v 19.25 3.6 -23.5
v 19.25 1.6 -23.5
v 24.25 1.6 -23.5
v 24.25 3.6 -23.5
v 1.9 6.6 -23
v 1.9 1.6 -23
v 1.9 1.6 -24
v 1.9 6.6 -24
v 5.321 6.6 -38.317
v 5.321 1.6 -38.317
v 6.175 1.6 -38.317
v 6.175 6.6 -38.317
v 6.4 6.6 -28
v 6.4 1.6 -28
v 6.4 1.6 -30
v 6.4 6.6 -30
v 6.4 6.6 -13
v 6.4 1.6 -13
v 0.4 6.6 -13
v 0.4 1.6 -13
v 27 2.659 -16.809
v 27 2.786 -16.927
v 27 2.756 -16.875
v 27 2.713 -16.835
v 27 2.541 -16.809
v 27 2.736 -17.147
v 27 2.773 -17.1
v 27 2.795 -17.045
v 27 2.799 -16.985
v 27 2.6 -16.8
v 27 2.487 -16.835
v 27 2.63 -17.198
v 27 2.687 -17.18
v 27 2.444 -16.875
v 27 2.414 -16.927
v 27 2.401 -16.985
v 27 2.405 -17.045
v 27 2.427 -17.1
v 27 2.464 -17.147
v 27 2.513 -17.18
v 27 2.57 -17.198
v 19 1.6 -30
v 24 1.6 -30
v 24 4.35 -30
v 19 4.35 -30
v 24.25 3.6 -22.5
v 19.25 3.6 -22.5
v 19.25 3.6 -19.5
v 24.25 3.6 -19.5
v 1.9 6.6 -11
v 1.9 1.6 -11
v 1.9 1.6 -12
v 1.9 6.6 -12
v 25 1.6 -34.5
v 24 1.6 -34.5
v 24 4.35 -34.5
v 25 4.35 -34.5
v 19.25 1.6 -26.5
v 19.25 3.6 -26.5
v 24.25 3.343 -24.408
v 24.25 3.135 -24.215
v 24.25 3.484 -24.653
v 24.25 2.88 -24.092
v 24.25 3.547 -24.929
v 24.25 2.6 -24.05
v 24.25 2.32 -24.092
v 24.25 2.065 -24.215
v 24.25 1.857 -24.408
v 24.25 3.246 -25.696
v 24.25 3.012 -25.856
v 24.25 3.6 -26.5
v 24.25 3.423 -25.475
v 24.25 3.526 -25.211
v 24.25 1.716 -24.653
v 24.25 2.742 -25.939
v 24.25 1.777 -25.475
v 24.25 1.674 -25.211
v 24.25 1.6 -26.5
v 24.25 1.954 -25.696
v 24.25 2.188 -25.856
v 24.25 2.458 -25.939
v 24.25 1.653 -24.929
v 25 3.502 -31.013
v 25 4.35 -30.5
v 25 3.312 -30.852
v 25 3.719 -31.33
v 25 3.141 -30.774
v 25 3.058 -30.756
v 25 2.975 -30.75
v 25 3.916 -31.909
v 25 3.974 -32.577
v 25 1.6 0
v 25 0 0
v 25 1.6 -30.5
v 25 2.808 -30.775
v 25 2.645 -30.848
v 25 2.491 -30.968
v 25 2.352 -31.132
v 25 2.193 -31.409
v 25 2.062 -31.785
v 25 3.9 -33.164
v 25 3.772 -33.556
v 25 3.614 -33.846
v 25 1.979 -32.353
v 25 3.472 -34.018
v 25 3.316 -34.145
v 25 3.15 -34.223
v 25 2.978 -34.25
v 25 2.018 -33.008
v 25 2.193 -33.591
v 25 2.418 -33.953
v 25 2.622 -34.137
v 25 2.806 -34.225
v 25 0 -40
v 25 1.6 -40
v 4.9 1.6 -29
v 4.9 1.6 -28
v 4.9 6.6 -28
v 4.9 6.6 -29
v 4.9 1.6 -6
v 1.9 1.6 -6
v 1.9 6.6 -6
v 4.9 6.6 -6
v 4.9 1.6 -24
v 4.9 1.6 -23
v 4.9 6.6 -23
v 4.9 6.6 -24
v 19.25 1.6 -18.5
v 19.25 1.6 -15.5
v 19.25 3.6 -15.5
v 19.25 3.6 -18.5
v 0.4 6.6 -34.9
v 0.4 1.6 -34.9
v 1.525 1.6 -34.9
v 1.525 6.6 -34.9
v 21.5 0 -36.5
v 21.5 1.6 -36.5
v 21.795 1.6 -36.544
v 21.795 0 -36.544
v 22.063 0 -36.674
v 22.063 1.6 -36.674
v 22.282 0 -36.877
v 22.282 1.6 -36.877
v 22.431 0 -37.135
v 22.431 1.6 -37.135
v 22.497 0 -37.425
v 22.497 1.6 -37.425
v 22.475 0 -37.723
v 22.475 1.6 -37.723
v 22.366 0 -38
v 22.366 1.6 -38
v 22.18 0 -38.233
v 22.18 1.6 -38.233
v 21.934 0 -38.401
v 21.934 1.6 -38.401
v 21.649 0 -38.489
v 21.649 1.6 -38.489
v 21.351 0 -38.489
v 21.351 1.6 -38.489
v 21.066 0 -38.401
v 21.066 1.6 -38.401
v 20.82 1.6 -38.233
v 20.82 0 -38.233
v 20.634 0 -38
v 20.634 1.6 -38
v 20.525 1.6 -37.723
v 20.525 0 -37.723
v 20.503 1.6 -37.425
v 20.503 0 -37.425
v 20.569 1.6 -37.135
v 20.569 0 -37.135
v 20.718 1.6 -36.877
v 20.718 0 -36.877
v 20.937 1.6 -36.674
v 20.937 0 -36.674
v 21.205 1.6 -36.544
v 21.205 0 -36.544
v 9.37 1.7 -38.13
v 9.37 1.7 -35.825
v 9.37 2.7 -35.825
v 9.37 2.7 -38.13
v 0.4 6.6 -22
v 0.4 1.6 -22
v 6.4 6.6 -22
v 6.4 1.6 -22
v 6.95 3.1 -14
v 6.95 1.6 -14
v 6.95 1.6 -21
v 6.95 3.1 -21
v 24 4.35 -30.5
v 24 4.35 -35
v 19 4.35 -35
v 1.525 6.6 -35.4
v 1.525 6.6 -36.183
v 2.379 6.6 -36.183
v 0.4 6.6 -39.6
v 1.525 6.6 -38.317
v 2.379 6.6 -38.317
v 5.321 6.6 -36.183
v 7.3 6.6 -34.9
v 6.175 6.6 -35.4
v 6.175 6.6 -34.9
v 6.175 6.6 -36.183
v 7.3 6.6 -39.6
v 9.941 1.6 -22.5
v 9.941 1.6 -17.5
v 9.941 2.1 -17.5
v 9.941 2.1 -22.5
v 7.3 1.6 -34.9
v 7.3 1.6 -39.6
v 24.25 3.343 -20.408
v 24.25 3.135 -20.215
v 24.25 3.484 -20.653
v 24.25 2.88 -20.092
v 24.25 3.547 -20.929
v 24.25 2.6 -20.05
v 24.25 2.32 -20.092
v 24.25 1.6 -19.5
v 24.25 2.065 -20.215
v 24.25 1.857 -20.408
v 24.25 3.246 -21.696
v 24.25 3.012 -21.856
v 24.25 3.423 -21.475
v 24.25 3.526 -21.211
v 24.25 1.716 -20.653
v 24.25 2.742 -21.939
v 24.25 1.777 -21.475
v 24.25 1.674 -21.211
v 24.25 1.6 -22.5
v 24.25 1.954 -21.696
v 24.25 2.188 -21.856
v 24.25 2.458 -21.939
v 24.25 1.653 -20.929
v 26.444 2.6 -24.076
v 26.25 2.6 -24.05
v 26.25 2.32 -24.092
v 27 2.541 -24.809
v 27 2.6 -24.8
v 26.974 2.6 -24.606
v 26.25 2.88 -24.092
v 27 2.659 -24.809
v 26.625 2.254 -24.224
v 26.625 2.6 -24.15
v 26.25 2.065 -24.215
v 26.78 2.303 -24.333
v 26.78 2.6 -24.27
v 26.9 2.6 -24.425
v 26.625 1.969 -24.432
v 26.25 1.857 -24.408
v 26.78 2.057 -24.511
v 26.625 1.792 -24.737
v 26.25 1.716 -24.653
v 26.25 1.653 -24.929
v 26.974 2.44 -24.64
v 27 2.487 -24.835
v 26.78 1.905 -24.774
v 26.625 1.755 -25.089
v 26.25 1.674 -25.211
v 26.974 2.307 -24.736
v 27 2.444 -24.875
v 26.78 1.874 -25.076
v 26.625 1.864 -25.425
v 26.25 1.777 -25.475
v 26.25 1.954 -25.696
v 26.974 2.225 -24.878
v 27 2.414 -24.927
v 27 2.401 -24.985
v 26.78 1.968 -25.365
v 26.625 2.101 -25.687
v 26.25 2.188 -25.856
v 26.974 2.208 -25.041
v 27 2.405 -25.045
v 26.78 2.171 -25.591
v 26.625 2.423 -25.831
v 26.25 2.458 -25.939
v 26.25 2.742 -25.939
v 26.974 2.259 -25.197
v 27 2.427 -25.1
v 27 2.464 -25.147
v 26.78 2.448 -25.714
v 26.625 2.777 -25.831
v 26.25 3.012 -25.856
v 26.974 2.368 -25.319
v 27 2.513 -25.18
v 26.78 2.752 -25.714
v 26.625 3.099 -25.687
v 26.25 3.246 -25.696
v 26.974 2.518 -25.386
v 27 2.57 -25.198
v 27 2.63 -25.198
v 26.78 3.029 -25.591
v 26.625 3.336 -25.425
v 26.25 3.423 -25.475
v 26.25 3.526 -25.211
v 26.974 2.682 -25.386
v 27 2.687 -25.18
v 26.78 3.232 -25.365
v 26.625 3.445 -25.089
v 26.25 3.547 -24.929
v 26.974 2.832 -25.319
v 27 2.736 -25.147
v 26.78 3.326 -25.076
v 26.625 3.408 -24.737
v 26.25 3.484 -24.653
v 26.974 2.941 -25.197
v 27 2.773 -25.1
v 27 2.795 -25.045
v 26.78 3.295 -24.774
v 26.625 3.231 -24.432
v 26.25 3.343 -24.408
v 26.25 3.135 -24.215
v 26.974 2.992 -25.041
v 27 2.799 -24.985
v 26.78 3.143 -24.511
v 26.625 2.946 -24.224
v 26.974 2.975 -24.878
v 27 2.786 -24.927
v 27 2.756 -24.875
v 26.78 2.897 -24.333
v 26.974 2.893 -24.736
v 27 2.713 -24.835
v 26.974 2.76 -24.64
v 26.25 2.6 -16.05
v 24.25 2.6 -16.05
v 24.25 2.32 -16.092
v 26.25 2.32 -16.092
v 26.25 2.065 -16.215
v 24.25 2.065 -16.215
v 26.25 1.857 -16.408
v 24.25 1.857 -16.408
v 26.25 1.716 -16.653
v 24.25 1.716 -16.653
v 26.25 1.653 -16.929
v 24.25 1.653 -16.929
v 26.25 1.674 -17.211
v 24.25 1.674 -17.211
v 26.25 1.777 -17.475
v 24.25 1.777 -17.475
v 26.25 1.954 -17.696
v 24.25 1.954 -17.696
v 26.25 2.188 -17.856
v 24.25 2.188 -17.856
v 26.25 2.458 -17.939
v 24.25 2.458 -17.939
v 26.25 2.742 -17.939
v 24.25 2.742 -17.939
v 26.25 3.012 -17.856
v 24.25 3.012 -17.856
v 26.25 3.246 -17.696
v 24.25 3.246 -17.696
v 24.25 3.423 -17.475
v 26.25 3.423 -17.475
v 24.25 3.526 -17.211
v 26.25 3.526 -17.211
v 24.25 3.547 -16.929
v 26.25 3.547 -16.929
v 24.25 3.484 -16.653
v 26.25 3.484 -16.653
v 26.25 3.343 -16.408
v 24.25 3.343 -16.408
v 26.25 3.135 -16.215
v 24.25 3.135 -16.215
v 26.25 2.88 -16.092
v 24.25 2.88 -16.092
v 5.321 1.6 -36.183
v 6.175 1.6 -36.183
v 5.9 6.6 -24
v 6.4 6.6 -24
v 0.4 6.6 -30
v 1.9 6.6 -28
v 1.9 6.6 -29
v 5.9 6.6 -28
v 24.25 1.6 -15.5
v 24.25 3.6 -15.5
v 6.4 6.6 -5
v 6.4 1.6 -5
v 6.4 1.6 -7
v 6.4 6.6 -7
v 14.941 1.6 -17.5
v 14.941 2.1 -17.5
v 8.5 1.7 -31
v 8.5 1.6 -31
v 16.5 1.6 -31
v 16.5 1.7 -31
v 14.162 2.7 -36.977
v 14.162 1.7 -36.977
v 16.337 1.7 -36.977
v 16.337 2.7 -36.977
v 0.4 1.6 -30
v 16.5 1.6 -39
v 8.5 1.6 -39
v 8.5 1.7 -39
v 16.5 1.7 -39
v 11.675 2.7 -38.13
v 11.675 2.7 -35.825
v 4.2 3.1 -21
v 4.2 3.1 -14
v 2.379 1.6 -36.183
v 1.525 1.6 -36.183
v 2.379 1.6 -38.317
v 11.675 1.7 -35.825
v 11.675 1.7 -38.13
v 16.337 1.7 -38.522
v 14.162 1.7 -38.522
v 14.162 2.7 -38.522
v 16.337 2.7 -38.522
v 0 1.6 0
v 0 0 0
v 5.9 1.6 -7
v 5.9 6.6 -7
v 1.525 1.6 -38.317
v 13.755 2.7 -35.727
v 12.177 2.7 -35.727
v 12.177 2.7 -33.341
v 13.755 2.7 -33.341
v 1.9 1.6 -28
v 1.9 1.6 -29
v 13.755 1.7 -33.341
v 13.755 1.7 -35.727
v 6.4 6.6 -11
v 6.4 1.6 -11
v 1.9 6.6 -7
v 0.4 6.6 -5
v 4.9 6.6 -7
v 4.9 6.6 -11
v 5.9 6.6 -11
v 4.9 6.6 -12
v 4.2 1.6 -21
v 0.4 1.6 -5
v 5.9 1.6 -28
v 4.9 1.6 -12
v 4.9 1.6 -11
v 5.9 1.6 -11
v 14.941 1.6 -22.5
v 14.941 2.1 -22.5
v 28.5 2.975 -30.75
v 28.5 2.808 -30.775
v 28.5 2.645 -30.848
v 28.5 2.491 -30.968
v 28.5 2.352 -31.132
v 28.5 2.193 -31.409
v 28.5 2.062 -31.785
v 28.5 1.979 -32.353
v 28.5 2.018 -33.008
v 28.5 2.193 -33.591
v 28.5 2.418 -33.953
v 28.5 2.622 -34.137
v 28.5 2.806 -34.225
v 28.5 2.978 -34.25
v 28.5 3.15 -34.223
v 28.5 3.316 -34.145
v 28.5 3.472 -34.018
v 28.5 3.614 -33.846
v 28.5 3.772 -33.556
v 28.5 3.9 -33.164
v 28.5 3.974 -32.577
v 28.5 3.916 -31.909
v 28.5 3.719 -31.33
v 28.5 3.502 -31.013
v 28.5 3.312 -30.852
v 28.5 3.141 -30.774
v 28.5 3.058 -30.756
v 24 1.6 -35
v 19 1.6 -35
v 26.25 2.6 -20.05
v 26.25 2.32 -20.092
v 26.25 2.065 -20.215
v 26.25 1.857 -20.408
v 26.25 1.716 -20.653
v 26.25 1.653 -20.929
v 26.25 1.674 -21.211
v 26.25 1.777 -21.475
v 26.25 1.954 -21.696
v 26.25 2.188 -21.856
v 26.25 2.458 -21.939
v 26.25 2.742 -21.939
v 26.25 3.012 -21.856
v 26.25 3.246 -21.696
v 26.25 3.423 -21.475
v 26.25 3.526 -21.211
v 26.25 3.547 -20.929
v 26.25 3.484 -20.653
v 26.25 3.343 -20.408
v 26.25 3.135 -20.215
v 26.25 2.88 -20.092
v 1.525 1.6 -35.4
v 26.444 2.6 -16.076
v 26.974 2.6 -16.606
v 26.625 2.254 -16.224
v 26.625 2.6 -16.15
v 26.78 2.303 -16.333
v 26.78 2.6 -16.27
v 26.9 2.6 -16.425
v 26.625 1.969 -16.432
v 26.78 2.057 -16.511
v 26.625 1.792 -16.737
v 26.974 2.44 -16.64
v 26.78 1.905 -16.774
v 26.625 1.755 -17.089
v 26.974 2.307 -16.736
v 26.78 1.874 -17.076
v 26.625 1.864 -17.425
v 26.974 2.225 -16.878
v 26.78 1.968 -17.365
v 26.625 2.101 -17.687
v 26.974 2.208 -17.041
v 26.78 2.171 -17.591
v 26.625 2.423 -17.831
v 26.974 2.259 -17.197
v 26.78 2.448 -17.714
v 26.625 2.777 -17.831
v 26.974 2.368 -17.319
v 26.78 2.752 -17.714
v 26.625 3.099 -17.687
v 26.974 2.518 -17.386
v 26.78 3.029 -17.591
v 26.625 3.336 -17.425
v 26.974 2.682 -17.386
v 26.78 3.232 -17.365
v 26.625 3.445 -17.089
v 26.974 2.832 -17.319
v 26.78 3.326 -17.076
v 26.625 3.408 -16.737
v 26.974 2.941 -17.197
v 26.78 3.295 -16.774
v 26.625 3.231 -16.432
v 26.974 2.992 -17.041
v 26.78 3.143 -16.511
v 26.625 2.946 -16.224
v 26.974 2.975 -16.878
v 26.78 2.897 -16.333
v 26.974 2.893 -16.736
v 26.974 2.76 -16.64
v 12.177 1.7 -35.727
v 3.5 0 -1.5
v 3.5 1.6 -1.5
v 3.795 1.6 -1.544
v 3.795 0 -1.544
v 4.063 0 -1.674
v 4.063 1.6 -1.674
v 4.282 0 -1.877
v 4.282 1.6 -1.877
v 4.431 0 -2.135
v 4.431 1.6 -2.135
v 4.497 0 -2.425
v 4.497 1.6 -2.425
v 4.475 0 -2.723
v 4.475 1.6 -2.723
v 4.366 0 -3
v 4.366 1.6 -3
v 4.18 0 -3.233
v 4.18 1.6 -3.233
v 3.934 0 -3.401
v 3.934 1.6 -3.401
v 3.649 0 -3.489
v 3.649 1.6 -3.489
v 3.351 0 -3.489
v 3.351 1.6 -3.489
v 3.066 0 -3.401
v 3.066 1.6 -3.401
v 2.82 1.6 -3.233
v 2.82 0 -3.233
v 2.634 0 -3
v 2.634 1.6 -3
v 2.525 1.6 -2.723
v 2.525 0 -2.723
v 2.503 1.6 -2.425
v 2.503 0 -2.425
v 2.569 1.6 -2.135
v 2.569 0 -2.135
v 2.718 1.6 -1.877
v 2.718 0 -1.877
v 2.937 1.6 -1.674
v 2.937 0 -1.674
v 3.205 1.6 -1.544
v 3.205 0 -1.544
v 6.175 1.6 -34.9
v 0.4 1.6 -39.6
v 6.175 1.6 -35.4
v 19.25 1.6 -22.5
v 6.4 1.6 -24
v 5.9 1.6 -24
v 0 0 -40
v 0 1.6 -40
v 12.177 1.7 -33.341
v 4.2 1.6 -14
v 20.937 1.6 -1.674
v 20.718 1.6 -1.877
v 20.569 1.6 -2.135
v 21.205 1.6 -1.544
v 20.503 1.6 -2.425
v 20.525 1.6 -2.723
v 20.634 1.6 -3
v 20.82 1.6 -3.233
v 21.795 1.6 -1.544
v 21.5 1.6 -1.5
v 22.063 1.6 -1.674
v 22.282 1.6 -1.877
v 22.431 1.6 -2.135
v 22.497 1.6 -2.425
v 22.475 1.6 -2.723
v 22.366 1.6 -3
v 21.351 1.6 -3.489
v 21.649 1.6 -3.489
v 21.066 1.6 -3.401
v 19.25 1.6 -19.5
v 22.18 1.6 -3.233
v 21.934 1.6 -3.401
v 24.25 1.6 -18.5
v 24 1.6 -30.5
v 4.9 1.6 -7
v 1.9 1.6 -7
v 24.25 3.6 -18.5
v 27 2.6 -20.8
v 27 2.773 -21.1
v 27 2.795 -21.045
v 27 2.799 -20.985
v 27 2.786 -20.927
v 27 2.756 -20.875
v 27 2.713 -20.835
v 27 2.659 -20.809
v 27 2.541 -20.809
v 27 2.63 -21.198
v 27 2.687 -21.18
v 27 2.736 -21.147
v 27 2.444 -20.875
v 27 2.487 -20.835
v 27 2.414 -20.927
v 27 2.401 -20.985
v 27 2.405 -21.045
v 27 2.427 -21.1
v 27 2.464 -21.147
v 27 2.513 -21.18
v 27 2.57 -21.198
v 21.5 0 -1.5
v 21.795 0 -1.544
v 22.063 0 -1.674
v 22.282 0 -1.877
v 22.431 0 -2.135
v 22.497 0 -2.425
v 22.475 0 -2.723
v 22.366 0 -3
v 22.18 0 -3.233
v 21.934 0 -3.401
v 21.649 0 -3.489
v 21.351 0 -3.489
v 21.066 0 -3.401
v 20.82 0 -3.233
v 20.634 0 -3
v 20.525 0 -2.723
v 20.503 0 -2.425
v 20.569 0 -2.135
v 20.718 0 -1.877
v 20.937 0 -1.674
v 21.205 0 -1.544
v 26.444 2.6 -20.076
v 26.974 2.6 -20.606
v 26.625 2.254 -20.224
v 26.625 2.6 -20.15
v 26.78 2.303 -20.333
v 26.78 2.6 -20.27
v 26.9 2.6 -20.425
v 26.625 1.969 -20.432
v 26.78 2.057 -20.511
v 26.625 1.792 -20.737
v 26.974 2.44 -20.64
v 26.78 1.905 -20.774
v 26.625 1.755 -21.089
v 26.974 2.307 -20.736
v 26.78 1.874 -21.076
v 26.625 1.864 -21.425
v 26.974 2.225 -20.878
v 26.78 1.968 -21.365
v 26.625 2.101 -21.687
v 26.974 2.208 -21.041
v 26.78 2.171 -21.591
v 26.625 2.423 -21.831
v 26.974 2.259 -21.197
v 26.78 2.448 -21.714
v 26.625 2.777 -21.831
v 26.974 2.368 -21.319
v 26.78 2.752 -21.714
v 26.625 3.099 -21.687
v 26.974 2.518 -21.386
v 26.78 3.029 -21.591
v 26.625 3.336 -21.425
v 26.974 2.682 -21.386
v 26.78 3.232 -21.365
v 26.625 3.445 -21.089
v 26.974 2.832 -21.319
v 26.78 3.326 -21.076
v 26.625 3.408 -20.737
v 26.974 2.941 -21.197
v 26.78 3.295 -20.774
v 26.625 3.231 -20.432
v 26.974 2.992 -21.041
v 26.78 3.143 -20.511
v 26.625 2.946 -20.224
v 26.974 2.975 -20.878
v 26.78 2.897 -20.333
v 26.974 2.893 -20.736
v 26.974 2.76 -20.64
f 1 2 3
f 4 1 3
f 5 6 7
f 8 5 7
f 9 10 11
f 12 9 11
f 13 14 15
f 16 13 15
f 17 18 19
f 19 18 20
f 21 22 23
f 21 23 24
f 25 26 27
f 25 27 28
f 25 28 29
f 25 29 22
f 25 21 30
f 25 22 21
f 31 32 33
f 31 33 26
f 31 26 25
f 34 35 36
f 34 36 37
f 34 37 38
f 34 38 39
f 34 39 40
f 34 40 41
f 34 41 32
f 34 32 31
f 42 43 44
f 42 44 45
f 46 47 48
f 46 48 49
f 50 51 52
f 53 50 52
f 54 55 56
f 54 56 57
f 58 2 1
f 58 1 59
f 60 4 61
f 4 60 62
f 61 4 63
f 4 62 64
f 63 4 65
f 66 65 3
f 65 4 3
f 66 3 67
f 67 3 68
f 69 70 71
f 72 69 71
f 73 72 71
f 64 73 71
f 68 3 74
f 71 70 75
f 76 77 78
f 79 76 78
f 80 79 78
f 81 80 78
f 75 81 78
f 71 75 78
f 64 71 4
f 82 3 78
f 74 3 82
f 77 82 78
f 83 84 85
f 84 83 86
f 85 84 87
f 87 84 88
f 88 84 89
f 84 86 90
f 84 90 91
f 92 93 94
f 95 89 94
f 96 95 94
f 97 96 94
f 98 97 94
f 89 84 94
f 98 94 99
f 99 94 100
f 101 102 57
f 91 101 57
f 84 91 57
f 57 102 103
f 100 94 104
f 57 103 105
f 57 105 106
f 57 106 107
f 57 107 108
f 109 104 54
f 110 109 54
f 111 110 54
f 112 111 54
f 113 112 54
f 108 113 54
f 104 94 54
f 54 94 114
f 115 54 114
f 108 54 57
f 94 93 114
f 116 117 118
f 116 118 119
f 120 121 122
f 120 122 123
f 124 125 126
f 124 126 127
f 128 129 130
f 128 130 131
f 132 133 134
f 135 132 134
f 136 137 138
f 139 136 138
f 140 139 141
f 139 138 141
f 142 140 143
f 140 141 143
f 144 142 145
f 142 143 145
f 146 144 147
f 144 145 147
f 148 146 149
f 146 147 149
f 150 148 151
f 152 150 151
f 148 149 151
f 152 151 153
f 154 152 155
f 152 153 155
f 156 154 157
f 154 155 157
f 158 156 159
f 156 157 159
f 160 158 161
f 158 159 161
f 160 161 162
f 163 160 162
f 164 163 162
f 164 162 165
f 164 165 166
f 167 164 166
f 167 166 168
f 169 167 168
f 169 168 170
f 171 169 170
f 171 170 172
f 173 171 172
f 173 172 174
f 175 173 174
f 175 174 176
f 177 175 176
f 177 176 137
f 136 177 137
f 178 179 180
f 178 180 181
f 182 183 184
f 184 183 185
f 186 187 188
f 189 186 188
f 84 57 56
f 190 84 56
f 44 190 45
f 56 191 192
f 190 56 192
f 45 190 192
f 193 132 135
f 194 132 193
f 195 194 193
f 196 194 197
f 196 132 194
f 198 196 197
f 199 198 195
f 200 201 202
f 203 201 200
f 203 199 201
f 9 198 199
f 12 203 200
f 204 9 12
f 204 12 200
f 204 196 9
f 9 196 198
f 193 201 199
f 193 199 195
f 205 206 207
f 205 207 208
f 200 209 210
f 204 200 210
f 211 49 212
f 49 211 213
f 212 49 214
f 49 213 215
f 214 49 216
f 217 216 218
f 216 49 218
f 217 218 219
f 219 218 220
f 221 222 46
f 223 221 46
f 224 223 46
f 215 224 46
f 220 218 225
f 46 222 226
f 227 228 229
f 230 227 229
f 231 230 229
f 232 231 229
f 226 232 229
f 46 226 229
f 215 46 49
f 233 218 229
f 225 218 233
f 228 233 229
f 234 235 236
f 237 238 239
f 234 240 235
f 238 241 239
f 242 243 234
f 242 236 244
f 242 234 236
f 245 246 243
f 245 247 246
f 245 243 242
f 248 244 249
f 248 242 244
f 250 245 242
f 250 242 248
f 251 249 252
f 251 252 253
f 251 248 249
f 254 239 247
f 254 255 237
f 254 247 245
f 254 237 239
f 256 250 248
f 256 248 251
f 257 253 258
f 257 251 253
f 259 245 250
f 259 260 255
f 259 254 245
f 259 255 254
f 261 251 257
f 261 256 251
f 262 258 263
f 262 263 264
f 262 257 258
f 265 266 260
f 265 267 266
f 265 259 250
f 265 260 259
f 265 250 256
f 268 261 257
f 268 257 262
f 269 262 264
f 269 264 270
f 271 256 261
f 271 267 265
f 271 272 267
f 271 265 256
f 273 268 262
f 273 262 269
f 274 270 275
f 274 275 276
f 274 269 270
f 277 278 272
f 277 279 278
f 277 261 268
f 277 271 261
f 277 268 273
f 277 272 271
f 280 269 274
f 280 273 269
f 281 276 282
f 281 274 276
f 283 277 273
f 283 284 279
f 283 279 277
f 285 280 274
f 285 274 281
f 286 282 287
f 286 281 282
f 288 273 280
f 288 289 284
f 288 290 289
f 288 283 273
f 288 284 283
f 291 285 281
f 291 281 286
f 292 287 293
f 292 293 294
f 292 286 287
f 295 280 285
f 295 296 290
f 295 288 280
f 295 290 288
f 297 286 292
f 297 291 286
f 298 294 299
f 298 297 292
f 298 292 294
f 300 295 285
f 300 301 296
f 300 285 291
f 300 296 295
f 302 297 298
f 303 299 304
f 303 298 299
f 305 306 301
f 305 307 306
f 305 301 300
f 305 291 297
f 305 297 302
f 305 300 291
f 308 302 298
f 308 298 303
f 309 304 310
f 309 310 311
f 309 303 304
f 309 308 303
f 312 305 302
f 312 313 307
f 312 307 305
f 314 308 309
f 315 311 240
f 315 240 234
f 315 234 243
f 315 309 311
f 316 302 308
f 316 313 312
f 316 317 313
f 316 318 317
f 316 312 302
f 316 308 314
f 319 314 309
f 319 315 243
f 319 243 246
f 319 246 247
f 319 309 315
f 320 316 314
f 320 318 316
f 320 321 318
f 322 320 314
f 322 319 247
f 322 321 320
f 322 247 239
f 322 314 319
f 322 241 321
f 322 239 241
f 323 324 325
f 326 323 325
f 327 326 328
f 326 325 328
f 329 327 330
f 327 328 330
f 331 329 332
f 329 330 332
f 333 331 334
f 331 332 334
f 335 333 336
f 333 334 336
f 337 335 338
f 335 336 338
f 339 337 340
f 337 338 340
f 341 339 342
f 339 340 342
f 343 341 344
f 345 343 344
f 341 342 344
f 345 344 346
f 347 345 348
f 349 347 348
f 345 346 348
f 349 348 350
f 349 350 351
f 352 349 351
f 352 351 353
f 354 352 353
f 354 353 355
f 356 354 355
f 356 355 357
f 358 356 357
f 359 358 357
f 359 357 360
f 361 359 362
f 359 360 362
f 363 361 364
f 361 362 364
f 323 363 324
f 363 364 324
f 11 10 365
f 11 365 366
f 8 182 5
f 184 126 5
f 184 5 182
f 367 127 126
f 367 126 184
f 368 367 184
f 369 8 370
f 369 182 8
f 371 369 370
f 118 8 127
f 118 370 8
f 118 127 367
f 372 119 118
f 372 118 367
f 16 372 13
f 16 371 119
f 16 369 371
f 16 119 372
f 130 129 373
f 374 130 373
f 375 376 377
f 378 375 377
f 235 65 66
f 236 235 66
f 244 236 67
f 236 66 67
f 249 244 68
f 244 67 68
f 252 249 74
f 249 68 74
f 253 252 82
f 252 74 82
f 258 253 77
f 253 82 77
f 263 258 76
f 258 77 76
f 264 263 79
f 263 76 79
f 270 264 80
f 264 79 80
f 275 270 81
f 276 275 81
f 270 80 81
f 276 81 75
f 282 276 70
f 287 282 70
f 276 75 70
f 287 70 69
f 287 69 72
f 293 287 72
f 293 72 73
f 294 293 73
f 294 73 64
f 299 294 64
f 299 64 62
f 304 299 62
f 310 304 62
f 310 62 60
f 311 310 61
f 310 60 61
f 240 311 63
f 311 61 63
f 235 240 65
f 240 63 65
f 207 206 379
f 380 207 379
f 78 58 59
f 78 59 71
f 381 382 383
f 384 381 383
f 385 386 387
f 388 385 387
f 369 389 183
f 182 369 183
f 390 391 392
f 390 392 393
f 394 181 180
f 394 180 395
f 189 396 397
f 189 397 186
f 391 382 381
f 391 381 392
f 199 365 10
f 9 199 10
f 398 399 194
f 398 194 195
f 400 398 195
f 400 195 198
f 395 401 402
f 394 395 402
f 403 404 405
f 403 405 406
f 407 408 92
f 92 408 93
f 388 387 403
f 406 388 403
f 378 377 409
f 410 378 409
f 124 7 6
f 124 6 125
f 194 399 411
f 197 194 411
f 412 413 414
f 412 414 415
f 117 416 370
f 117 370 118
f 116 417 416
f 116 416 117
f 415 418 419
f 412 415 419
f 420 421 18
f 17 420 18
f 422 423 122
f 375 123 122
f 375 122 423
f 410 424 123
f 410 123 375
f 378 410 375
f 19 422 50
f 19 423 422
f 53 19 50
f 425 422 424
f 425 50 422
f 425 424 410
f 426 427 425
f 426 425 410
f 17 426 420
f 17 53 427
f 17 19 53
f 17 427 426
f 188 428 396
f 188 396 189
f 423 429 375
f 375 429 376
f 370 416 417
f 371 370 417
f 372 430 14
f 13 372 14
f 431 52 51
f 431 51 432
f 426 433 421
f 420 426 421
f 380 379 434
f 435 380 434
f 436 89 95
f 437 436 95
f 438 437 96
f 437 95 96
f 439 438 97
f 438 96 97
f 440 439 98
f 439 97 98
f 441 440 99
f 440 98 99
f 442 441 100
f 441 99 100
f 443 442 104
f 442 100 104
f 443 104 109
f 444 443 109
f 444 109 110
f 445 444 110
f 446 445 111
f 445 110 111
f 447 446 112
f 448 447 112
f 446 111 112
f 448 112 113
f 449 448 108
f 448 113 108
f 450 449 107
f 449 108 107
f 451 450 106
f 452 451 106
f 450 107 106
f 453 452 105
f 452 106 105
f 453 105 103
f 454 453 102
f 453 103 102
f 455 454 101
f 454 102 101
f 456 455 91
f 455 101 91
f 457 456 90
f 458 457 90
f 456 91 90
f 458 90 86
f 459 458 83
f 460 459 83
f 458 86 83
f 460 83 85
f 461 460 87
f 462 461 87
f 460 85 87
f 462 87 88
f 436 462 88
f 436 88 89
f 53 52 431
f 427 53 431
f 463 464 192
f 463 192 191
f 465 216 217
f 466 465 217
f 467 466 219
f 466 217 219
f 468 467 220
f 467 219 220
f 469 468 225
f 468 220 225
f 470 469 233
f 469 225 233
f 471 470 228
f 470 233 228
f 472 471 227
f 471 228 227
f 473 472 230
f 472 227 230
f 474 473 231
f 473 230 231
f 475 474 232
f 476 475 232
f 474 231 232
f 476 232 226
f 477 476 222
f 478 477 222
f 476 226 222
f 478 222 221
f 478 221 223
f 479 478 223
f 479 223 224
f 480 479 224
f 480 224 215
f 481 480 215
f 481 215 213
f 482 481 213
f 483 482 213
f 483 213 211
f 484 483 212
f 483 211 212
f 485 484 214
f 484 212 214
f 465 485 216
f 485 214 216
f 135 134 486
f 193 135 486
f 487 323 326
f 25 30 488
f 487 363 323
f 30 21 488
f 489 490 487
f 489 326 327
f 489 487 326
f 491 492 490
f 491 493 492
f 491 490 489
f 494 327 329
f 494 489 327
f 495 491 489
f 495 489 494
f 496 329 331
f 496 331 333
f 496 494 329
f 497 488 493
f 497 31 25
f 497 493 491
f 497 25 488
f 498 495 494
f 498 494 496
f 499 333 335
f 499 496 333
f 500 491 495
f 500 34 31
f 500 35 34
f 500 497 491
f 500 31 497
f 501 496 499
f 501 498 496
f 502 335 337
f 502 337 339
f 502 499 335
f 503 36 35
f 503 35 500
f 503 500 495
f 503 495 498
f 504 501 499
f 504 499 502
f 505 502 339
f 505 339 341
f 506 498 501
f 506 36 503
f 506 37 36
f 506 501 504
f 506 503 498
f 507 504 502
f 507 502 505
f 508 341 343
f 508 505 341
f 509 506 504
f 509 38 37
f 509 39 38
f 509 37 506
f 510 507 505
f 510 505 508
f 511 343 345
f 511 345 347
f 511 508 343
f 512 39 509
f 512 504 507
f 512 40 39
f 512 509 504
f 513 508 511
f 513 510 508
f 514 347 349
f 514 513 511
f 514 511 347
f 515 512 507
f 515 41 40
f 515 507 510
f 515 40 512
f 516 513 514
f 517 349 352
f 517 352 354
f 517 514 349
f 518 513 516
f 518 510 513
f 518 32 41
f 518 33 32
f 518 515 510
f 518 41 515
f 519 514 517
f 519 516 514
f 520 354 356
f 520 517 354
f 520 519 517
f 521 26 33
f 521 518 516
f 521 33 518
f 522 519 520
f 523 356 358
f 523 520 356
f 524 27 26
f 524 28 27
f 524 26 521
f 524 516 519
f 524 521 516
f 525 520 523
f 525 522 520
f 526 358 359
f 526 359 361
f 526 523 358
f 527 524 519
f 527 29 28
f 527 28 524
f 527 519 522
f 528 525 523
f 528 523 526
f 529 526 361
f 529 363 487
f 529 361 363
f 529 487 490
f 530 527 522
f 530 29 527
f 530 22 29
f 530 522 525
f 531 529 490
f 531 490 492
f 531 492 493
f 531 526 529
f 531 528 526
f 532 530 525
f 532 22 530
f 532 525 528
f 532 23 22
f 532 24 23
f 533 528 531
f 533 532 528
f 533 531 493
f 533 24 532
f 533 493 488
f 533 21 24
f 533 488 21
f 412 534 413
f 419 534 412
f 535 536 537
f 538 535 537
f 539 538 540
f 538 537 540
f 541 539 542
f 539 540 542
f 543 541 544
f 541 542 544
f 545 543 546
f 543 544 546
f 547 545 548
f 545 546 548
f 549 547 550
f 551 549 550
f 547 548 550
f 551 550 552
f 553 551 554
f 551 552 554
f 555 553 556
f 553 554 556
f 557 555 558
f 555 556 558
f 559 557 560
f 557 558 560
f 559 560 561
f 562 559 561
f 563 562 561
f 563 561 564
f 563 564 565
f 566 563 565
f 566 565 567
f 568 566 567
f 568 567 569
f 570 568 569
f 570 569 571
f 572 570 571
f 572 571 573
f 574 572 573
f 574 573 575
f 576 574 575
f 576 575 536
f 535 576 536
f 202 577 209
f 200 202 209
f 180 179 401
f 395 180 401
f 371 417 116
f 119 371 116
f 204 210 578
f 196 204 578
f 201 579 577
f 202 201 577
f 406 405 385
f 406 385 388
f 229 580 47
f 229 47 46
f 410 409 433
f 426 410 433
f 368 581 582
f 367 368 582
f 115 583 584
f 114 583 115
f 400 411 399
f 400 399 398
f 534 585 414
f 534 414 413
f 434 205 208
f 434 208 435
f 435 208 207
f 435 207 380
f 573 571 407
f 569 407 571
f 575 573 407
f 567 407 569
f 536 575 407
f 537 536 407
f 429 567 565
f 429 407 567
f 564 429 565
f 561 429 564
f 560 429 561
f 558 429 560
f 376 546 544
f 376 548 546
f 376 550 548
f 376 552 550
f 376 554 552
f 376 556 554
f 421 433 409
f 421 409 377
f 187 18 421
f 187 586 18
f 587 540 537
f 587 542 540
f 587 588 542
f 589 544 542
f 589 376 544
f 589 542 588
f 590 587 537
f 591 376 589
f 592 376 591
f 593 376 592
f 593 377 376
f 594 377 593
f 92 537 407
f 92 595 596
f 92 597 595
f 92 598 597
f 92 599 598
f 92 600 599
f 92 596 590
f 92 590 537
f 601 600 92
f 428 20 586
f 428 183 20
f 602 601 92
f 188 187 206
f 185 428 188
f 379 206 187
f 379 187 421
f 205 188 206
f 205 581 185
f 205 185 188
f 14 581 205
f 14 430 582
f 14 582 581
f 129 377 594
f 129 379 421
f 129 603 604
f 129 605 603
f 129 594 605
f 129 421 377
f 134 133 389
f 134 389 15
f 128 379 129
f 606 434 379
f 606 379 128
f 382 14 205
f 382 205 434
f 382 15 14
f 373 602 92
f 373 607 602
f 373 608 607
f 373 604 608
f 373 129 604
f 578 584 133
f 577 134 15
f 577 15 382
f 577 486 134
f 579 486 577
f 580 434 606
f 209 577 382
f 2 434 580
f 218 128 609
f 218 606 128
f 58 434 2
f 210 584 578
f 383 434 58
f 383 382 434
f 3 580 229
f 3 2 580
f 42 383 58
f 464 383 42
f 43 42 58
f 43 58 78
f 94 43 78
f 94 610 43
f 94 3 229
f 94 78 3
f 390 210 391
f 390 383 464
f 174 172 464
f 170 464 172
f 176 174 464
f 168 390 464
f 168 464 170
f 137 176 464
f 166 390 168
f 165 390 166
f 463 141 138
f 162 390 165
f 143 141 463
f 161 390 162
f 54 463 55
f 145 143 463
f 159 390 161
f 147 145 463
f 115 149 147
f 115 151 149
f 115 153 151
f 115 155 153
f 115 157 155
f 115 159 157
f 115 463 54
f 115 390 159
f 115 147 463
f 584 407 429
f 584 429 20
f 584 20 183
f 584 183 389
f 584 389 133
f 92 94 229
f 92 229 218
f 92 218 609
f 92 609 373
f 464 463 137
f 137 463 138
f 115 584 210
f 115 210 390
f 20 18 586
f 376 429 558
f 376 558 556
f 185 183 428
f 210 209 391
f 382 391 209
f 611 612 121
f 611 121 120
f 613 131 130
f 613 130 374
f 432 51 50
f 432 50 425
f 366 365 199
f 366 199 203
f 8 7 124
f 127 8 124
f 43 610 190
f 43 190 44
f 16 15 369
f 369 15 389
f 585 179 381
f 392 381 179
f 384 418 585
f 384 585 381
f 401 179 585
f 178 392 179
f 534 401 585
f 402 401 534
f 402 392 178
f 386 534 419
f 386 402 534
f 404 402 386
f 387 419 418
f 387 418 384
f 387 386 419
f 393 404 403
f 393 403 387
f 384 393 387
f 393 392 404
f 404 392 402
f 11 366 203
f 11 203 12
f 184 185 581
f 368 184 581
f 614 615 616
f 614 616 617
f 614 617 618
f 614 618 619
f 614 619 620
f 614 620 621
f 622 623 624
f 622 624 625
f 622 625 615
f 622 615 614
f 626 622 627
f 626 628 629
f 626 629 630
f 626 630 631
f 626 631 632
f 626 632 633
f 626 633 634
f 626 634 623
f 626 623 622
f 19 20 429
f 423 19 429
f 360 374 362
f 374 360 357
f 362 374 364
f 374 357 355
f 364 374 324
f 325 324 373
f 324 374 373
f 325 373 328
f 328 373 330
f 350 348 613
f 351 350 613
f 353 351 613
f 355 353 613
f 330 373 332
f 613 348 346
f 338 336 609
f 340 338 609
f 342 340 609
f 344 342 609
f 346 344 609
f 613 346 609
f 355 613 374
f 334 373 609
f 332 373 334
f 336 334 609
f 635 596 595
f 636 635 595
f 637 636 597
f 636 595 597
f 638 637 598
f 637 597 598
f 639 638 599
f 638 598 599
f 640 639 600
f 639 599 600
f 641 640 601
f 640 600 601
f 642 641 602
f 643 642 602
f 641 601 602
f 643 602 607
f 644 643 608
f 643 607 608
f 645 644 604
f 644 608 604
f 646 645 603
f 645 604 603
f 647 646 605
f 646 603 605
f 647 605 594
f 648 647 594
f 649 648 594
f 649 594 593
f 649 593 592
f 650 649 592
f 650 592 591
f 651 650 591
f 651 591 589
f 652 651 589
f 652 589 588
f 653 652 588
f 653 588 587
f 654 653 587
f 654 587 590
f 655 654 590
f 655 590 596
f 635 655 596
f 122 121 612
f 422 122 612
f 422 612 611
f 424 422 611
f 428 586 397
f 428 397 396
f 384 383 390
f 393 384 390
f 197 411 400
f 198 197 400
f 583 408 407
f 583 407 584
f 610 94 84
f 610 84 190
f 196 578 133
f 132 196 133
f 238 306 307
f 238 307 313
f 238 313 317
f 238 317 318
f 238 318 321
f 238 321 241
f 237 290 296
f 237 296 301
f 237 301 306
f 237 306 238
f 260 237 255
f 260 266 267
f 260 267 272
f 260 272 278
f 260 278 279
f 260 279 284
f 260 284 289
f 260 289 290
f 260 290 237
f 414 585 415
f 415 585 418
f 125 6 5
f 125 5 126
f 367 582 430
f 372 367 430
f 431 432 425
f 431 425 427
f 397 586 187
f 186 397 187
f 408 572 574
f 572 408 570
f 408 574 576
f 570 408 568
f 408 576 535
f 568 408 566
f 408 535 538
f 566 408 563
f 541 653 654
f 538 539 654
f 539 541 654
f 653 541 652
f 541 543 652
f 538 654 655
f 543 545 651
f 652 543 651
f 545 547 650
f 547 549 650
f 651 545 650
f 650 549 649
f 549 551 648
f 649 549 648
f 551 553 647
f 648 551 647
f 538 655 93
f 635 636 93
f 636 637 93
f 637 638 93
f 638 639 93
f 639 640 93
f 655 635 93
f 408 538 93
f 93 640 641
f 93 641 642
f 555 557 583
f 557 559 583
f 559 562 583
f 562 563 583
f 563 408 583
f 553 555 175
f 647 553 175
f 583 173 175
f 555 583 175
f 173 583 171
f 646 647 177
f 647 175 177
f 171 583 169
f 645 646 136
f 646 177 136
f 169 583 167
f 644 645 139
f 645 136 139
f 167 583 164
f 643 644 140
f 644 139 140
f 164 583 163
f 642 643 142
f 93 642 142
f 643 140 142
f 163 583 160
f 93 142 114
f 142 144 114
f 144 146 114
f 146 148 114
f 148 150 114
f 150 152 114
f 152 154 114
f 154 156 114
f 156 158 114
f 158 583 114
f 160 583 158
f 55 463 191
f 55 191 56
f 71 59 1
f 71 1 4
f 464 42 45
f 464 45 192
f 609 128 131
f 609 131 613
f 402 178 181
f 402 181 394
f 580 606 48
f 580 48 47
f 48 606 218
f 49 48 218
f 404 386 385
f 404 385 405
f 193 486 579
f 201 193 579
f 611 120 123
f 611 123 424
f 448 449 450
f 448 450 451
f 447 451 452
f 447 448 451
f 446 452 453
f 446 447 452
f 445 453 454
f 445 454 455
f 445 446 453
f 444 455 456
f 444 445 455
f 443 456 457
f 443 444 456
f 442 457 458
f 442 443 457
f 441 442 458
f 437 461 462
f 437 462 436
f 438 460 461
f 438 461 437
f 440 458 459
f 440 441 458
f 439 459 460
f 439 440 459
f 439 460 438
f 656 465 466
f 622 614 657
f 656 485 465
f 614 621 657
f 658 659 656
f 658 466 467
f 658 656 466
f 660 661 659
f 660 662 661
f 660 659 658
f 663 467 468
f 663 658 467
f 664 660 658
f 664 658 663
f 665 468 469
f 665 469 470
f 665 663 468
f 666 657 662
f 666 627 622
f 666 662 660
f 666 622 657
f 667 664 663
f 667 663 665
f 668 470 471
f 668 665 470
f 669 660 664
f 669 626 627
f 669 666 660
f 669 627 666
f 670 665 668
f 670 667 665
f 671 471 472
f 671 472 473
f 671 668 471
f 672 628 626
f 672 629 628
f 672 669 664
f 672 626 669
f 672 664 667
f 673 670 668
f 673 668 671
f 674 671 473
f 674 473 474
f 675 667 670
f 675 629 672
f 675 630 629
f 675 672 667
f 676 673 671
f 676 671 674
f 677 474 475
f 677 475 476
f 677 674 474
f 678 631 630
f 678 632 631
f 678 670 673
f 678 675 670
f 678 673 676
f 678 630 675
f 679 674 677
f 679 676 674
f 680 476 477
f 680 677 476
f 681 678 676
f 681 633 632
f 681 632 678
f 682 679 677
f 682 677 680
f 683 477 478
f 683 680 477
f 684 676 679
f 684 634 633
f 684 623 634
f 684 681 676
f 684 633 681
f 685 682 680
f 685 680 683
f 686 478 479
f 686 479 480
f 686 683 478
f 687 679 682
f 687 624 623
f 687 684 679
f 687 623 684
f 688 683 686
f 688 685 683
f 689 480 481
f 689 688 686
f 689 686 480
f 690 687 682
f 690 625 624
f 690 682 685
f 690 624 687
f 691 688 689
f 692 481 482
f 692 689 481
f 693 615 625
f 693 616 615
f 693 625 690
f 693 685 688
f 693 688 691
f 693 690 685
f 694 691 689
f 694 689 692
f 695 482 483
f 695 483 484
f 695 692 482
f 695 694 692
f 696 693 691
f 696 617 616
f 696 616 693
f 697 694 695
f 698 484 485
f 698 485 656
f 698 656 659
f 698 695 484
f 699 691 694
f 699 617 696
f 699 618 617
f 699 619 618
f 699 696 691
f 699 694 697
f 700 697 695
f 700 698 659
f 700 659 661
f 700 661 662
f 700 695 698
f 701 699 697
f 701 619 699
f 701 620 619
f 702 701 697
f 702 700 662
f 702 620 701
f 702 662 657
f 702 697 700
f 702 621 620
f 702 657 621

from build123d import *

# Parameters (mm, degrees)
SKETCH1_W              = 25
SKETCH1_H              = 40
BOSS_EXTRUDE1_DEPTH    = 1.6
SKETCH2_W              = 5
SKETCH2_H              = 5
BOSS_EXTRUDE2_DEPTH    = 0.5
SKETCH3_W              = 5
SKETCH3_H              = 3
BOSS_EXTRUDE3_DEPTH    = 2
SKETCH4_R              = 0.95
BOSS_EXTRUDE6_DEPTH    = 2.75
FILLET2_R              = 0.75
LPATTERN2_COUNT        = 3
LPATTERN2_PITCH        = 4
FILLET2_OF_LPATTERN2_R = 0.75
BOSS_EXTRUDE7_DEPTH    = 2.75
SKETCH6_RX             = 1.75
SKETCH6_RY             = 1
BOSS_EXTRUDE8_DEPTH    = 3.5
SKETCH7_W              = 8
SKETCH7_H              = 8
SKETCH7_W_2            = 2.174963518
SKETCH7_H_2            = 1.544625232
SKETCH7_W_3            = 2.304661065
SKETCH7_H_3            = 2.304661065
SKETCH7_W_4            = 1.577304609
SKETCH7_H_4            = 2.386179735
BOSS_EXTRUDE9_DEPTH    = 0.1
SKETCH8_W              = 2.304661065
SKETCH8_H              = 2.304661065
SKETCH8_W_2            = 1.577304609
SKETCH8_H_2            = 2.386179735
SKETCH8_W_3            = 2.174963518
SKETCH8_H_3            = 1.544625232
BOSS_EXTRUDE10_DEPTH   = 1
SKETCH9_W              = 2.75
SKETCH9_H              = 7
BOSS_EXTRUDE11_DEPTH   = 1.5
SKETCH10_W             = 3
SKETCH10_H             = 1
BOSS_EXTRUDE12_DEPTH   = 5
LPATTERN3_COUNT        = 2
LPATTERN3_PITCH        = 17
SKETCH11_W             = 0.854141563
SKETCH11_H             = 2.134375226
BOSS_EXTRUDE13_DEPTH   = 5
CUT_EXTRUDE1_REACH     = 51.369
SKETCH12_R             = 1


with BuildPart() as part:
    # Sketch1 → Boss-Extrude1 (new body)
    with BuildSketch(Plane(origin=(0, 0, 0), x_dir=(1, 0, 0), z_dir=(0, 1, 0))):
        with Locations((12.5, 20)):
            Rectangle(SKETCH1_W, SKETCH1_H)
    extrude(amount=BOSS_EXTRUDE1_DEPTH)

    # Sketch2 → Boss-Extrude2 (add)
    with BuildSketch(Plane(origin=(0, 1.6, 0), x_dir=(1, 0, 0), z_dir=(0, 1, 0))):
        with Locations((12.441080564, 20)):
            Rectangle(SKETCH2_W, SKETCH2_H)
    extrude(amount=BOSS_EXTRUDE2_DEPTH)

    # Sketch3 → Boss-Extrude3 (add)
    with BuildSketch(Plane(origin=(0, 1.6, 0), x_dir=(1, 0, 0), z_dir=(0, 1, 0))):
        with Locations((21.75, 17)):
            Rectangle(SKETCH3_W, SKETCH3_H)
    boss_extrude3 = extrude(amount=BOSS_EXTRUDE3_DEPTH)

    # Sketch4 → Boss-Extrude6 (add)
    with BuildSketch(Plane(origin=(24.25, 0, 0), x_dir=(0, 0, -1), z_dir=(1, 0, 0))):
        with Locations(Location((17, 2.6, 0), (0, 0, 180))):
            Circle(SKETCH4_R)
    boss_extrude6 = extrude(amount=BOSS_EXTRUDE6_DEPTH)

    # Fillet2
    fillet2_edges = [part.edges().sort_by_distance(p)[0] for p in [
        (27, 2.6, -17.95),
    ]]
    fillet(fillet2_edges, radius=FILLET2_R)

    # LPattern2: Boss-Extrude3, Boss-Extrude6 ×3
    with Locations(*[(0, 0, -i * LPATTERN2_PITCH) for i in range(1, LPATTERN2_COUNT)]):
        add(boss_extrude3)
        add(boss_extrude6)

    # Fillet2 of LPattern2
    fillet2_of_lpattern2_edges = [part.edges().sort_by_distance(p)[0] for p in [
        (27, 2.6, -21.95),
        (27, 2.6, -25.95),
    ]]
    fillet(fillet2_of_lpattern2_edges, radius=FILLET2_OF_LPATTERN2_R)

    # Sketch5 → Boss-Extrude7 (add)
    with BuildSketch(Plane(origin=(0, 1.6, 0), x_dir=(1, 0, 0), z_dir=(0, 1, 0))):
        Polygon((24, 30.5), (24, 30), (19, 30), (19, 35), (24, 35), (24, 34.5), (25, 34.5), (25, 30.5), align=None)
    extrude(amount=BOSS_EXTRUDE7_DEPTH)

    # Sketch6 → Boss-Extrude8 (add)
    with BuildSketch(Plane(origin=(25, 0, 0), x_dir=(0, 0, -1), z_dir=(1, 0, 0))):
        with Locations(Location((32.5, 2.975), (0, 0, 180))):
            Ellipse(SKETCH6_RX, SKETCH6_RY)
    extrude(amount=BOSS_EXTRUDE8_DEPTH)

    # Sketch7 → Boss-Extrude9 (add)
    # profile 1 of 4: a face of its own
    with BuildSketch(Plane(origin=(0, 1.6, 0), x_dir=(1, 0, 0), z_dir=(0, 1, 0))):
        with Locations((12.5, 35)):
            Rectangle(SKETCH7_W, SKETCH7_H)
        with Locations((15.249590998, 37.749590998)):
            Rectangle(SKETCH7_W_2, SKETCH7_H_2, mode=Mode.SUBTRACT)
        with Locations((10.522721618, 36.977278383)):
            Rectangle(SKETCH7_W_3, SKETCH7_H_3, mode=Mode.SUBTRACT)
        with Locations((12.965958092, 34.534041908)):
            Rectangle(SKETCH7_W_4, SKETCH7_H_4, mode=Mode.SUBTRACT)
    # profile 2 of 4: a face of its own
    with BuildSketch(Plane(origin=(0, 1.6, 0), x_dir=(1, 0, 0), z_dir=(0, 1, 0))):
        with Locations((15.249590998, 37.749590998)):
            Rectangle(SKETCH7_W_2, SKETCH7_H_2)
    # profile 3 of 4: a face of its own
    with BuildSketch(Plane(origin=(0, 1.6, 0), x_dir=(1, 0, 0), z_dir=(0, 1, 0))):
        with Locations((10.522721618, 36.977278383)):
            Rectangle(SKETCH7_W_3, SKETCH7_H_3)
    # profile 4 of 4: a face of its own
    with BuildSketch(Plane(origin=(0, 1.6, 0), x_dir=(1, 0, 0), z_dir=(0, 1, 0))):
        with Locations((12.965958092, 34.534041908)):
            Rectangle(SKETCH7_W_4, SKETCH7_H_4)
    extrude(amount=BOSS_EXTRUDE9_DEPTH)

    # Sketch8 → Boss-Extrude10 (add)
    with BuildSketch(Plane(origin=(0, 1.7, 0), x_dir=(1, 0, 0), z_dir=(0, 1, 0))):
        with Locations((10.522721618, 36.977278383)):
            Rectangle(SKETCH8_W, SKETCH8_H)
        with Locations((12.965958092, 34.534041908)):
            Rectangle(SKETCH8_W_2, SKETCH8_H_2)
        with Locations((15.249590998, 37.749590998)):
            Rectangle(SKETCH8_W_3, SKETCH8_H_3)
    extrude(amount=BOSS_EXTRUDE10_DEPTH)

    # Sketch9 → Boss-Extrude11 (add)
    with BuildSketch(Plane(origin=(0, 1.6, 0), x_dir=(1, 0, 0), z_dir=(0, 1, 0))):
        with Locations((5.575, 17.5)):
            Rectangle(SKETCH9_W, SKETCH9_H)
    extrude(amount=BOSS_EXTRUDE11_DEPTH)

    # Sketch10 → Boss-Extrude12 (add)
    with BuildSketch(Plane(origin=(0, 1.6, 0), x_dir=(1, 0, 0), z_dir=(0, 1, 0))):
        Polygon((6.4, 13), (0.4, 13), (0.4, 5), (6.4, 5), (6.4, 7), (5.9, 7), (5.9, 11), (6.4, 11), align=None)
        with Locations((3.4, 11.5)):
            Rectangle(SKETCH10_W, SKETCH10_H, mode=Mode.SUBTRACT)
        with Locations((3.4, 6.5)):
            Rectangle(SKETCH10_W, SKETCH10_H, mode=Mode.SUBTRACT)
    boss_extrude12 = extrude(amount=BOSS_EXTRUDE12_DEPTH)

    # LPattern3: Boss-Extrude12 ×2
    with Locations(*[(0, 0, -i * LPATTERN3_PITCH) for i in range(1, LPATTERN3_COUNT)]):
        add(boss_extrude12)

    # Sketch11 → Boss-Extrude13 (add)
    with BuildSketch(Plane(origin=(0, 1.6, 0), x_dir=(1, 0, 0), z_dir=(0, 1, 0))):
        Polygon((7.3, 39.6), (0.4, 39.6), (0.4, 34.9), (1.524996245, 34.9), (1.524996245, 35.4), (6.175003755, 35.4), (6.175003755, 34.9), (7.3, 34.9), align=None)
        with Locations((5.747932974, 37.25)):
            Rectangle(SKETCH11_W, SKETCH11_H, mode=Mode.SUBTRACT)
        with Locations((1.952067027, 37.25)):
            Rectangle(SKETCH11_W, SKETCH11_H, mode=Mode.SUBTRACT)
    extrude(amount=BOSS_EXTRUDE13_DEPTH)

    # Sketch12 → Cut-Extrude1 (cut, up to next)
    with BuildSketch(Plane(origin=(0, 1.6, 0), x_dir=(1, 0, 0), z_dir=(0, 1, 0)), mode=Mode.PRIVATE) as cut_extrude1_sk1:
        with Locations(Location((3.5, 2.5, 0), (0, 0, 270))):
            Circle(SKETCH12_R)
    cut_extrude1_tool1 = extrude(cut_extrude1_sk1.sketch, amount=-CUT_EXTRUDE1_REACH, mode=Mode.PRIVATE) & part.part
    # Sketch12 → Cut-Extrude1 (cut, up to next)
    with BuildSketch(Plane(origin=(0, 1.6, 0), x_dir=(1, 0, 0), z_dir=(0, 1, 0)), mode=Mode.PRIVATE) as cut_extrude1_sk2:
        with Locations(Location((21.5, 2.5, 0), (0, 0, 270))):
            Circle(SKETCH12_R)
    cut_extrude1_tool2 = extrude(cut_extrude1_sk2.sketch, amount=-CUT_EXTRUDE1_REACH, mode=Mode.PRIVATE) & part.part
    # Sketch12 → Cut-Extrude1 (cut, up to next)
    with BuildSketch(Plane(origin=(0, 1.6, 0), x_dir=(1, 0, 0), z_dir=(0, 1, 0)), mode=Mode.PRIVATE) as cut_extrude1_sk3:
        with Locations(Location((21.5, 37.5, 0), (0, 0, 270))):
            Circle(SKETCH12_R)
    cut_extrude1_tool3 = extrude(cut_extrude1_sk3.sketch, amount=-CUT_EXTRUDE1_REACH, mode=Mode.PRIVATE) & part.part
    add(cut_extrude1_tool1.solids().sort_by_distance((3.5, 1.6, -2.5))[0], mode=Mode.SUBTRACT)
    add(cut_extrude1_tool2.solids().sort_by_distance((21.5, 1.6, -2.5))[0], mode=Mode.SUBTRACT)
    add(cut_extrude1_tool3.solids().sort_by_distance((21.5, 1.6, -37.5))[0], mode=Mode.SUBTRACT)


solid = part.part
